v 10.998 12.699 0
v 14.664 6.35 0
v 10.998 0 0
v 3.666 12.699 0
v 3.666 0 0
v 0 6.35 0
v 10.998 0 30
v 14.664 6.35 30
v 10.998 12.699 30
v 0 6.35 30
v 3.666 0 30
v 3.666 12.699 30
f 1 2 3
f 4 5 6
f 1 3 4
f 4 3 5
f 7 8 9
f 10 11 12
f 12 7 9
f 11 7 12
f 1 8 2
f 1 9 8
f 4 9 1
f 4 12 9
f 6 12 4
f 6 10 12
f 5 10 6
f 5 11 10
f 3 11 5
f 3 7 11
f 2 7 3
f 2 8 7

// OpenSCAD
$fn = 32;

// ----------------------------------------------------------------------
// Key bar: hex key, 30 mm thick
// ----------------------------------------------------------------------

// --- parameters (mm) ---
profile_height = 30;      // extrusion height
profile_points = 6;       // points of the closed outline

profile = [[14.664, 6.35], [10.998, 12.699], [3.666, 12.699], [0, 6.35], [3.666, 0], [10.998, 0]];  // single closed polygon, 6 points, counter clockwise

// --- the one profile operation ---
linear_extrude(height = profile_height) polygon(points = profile);
